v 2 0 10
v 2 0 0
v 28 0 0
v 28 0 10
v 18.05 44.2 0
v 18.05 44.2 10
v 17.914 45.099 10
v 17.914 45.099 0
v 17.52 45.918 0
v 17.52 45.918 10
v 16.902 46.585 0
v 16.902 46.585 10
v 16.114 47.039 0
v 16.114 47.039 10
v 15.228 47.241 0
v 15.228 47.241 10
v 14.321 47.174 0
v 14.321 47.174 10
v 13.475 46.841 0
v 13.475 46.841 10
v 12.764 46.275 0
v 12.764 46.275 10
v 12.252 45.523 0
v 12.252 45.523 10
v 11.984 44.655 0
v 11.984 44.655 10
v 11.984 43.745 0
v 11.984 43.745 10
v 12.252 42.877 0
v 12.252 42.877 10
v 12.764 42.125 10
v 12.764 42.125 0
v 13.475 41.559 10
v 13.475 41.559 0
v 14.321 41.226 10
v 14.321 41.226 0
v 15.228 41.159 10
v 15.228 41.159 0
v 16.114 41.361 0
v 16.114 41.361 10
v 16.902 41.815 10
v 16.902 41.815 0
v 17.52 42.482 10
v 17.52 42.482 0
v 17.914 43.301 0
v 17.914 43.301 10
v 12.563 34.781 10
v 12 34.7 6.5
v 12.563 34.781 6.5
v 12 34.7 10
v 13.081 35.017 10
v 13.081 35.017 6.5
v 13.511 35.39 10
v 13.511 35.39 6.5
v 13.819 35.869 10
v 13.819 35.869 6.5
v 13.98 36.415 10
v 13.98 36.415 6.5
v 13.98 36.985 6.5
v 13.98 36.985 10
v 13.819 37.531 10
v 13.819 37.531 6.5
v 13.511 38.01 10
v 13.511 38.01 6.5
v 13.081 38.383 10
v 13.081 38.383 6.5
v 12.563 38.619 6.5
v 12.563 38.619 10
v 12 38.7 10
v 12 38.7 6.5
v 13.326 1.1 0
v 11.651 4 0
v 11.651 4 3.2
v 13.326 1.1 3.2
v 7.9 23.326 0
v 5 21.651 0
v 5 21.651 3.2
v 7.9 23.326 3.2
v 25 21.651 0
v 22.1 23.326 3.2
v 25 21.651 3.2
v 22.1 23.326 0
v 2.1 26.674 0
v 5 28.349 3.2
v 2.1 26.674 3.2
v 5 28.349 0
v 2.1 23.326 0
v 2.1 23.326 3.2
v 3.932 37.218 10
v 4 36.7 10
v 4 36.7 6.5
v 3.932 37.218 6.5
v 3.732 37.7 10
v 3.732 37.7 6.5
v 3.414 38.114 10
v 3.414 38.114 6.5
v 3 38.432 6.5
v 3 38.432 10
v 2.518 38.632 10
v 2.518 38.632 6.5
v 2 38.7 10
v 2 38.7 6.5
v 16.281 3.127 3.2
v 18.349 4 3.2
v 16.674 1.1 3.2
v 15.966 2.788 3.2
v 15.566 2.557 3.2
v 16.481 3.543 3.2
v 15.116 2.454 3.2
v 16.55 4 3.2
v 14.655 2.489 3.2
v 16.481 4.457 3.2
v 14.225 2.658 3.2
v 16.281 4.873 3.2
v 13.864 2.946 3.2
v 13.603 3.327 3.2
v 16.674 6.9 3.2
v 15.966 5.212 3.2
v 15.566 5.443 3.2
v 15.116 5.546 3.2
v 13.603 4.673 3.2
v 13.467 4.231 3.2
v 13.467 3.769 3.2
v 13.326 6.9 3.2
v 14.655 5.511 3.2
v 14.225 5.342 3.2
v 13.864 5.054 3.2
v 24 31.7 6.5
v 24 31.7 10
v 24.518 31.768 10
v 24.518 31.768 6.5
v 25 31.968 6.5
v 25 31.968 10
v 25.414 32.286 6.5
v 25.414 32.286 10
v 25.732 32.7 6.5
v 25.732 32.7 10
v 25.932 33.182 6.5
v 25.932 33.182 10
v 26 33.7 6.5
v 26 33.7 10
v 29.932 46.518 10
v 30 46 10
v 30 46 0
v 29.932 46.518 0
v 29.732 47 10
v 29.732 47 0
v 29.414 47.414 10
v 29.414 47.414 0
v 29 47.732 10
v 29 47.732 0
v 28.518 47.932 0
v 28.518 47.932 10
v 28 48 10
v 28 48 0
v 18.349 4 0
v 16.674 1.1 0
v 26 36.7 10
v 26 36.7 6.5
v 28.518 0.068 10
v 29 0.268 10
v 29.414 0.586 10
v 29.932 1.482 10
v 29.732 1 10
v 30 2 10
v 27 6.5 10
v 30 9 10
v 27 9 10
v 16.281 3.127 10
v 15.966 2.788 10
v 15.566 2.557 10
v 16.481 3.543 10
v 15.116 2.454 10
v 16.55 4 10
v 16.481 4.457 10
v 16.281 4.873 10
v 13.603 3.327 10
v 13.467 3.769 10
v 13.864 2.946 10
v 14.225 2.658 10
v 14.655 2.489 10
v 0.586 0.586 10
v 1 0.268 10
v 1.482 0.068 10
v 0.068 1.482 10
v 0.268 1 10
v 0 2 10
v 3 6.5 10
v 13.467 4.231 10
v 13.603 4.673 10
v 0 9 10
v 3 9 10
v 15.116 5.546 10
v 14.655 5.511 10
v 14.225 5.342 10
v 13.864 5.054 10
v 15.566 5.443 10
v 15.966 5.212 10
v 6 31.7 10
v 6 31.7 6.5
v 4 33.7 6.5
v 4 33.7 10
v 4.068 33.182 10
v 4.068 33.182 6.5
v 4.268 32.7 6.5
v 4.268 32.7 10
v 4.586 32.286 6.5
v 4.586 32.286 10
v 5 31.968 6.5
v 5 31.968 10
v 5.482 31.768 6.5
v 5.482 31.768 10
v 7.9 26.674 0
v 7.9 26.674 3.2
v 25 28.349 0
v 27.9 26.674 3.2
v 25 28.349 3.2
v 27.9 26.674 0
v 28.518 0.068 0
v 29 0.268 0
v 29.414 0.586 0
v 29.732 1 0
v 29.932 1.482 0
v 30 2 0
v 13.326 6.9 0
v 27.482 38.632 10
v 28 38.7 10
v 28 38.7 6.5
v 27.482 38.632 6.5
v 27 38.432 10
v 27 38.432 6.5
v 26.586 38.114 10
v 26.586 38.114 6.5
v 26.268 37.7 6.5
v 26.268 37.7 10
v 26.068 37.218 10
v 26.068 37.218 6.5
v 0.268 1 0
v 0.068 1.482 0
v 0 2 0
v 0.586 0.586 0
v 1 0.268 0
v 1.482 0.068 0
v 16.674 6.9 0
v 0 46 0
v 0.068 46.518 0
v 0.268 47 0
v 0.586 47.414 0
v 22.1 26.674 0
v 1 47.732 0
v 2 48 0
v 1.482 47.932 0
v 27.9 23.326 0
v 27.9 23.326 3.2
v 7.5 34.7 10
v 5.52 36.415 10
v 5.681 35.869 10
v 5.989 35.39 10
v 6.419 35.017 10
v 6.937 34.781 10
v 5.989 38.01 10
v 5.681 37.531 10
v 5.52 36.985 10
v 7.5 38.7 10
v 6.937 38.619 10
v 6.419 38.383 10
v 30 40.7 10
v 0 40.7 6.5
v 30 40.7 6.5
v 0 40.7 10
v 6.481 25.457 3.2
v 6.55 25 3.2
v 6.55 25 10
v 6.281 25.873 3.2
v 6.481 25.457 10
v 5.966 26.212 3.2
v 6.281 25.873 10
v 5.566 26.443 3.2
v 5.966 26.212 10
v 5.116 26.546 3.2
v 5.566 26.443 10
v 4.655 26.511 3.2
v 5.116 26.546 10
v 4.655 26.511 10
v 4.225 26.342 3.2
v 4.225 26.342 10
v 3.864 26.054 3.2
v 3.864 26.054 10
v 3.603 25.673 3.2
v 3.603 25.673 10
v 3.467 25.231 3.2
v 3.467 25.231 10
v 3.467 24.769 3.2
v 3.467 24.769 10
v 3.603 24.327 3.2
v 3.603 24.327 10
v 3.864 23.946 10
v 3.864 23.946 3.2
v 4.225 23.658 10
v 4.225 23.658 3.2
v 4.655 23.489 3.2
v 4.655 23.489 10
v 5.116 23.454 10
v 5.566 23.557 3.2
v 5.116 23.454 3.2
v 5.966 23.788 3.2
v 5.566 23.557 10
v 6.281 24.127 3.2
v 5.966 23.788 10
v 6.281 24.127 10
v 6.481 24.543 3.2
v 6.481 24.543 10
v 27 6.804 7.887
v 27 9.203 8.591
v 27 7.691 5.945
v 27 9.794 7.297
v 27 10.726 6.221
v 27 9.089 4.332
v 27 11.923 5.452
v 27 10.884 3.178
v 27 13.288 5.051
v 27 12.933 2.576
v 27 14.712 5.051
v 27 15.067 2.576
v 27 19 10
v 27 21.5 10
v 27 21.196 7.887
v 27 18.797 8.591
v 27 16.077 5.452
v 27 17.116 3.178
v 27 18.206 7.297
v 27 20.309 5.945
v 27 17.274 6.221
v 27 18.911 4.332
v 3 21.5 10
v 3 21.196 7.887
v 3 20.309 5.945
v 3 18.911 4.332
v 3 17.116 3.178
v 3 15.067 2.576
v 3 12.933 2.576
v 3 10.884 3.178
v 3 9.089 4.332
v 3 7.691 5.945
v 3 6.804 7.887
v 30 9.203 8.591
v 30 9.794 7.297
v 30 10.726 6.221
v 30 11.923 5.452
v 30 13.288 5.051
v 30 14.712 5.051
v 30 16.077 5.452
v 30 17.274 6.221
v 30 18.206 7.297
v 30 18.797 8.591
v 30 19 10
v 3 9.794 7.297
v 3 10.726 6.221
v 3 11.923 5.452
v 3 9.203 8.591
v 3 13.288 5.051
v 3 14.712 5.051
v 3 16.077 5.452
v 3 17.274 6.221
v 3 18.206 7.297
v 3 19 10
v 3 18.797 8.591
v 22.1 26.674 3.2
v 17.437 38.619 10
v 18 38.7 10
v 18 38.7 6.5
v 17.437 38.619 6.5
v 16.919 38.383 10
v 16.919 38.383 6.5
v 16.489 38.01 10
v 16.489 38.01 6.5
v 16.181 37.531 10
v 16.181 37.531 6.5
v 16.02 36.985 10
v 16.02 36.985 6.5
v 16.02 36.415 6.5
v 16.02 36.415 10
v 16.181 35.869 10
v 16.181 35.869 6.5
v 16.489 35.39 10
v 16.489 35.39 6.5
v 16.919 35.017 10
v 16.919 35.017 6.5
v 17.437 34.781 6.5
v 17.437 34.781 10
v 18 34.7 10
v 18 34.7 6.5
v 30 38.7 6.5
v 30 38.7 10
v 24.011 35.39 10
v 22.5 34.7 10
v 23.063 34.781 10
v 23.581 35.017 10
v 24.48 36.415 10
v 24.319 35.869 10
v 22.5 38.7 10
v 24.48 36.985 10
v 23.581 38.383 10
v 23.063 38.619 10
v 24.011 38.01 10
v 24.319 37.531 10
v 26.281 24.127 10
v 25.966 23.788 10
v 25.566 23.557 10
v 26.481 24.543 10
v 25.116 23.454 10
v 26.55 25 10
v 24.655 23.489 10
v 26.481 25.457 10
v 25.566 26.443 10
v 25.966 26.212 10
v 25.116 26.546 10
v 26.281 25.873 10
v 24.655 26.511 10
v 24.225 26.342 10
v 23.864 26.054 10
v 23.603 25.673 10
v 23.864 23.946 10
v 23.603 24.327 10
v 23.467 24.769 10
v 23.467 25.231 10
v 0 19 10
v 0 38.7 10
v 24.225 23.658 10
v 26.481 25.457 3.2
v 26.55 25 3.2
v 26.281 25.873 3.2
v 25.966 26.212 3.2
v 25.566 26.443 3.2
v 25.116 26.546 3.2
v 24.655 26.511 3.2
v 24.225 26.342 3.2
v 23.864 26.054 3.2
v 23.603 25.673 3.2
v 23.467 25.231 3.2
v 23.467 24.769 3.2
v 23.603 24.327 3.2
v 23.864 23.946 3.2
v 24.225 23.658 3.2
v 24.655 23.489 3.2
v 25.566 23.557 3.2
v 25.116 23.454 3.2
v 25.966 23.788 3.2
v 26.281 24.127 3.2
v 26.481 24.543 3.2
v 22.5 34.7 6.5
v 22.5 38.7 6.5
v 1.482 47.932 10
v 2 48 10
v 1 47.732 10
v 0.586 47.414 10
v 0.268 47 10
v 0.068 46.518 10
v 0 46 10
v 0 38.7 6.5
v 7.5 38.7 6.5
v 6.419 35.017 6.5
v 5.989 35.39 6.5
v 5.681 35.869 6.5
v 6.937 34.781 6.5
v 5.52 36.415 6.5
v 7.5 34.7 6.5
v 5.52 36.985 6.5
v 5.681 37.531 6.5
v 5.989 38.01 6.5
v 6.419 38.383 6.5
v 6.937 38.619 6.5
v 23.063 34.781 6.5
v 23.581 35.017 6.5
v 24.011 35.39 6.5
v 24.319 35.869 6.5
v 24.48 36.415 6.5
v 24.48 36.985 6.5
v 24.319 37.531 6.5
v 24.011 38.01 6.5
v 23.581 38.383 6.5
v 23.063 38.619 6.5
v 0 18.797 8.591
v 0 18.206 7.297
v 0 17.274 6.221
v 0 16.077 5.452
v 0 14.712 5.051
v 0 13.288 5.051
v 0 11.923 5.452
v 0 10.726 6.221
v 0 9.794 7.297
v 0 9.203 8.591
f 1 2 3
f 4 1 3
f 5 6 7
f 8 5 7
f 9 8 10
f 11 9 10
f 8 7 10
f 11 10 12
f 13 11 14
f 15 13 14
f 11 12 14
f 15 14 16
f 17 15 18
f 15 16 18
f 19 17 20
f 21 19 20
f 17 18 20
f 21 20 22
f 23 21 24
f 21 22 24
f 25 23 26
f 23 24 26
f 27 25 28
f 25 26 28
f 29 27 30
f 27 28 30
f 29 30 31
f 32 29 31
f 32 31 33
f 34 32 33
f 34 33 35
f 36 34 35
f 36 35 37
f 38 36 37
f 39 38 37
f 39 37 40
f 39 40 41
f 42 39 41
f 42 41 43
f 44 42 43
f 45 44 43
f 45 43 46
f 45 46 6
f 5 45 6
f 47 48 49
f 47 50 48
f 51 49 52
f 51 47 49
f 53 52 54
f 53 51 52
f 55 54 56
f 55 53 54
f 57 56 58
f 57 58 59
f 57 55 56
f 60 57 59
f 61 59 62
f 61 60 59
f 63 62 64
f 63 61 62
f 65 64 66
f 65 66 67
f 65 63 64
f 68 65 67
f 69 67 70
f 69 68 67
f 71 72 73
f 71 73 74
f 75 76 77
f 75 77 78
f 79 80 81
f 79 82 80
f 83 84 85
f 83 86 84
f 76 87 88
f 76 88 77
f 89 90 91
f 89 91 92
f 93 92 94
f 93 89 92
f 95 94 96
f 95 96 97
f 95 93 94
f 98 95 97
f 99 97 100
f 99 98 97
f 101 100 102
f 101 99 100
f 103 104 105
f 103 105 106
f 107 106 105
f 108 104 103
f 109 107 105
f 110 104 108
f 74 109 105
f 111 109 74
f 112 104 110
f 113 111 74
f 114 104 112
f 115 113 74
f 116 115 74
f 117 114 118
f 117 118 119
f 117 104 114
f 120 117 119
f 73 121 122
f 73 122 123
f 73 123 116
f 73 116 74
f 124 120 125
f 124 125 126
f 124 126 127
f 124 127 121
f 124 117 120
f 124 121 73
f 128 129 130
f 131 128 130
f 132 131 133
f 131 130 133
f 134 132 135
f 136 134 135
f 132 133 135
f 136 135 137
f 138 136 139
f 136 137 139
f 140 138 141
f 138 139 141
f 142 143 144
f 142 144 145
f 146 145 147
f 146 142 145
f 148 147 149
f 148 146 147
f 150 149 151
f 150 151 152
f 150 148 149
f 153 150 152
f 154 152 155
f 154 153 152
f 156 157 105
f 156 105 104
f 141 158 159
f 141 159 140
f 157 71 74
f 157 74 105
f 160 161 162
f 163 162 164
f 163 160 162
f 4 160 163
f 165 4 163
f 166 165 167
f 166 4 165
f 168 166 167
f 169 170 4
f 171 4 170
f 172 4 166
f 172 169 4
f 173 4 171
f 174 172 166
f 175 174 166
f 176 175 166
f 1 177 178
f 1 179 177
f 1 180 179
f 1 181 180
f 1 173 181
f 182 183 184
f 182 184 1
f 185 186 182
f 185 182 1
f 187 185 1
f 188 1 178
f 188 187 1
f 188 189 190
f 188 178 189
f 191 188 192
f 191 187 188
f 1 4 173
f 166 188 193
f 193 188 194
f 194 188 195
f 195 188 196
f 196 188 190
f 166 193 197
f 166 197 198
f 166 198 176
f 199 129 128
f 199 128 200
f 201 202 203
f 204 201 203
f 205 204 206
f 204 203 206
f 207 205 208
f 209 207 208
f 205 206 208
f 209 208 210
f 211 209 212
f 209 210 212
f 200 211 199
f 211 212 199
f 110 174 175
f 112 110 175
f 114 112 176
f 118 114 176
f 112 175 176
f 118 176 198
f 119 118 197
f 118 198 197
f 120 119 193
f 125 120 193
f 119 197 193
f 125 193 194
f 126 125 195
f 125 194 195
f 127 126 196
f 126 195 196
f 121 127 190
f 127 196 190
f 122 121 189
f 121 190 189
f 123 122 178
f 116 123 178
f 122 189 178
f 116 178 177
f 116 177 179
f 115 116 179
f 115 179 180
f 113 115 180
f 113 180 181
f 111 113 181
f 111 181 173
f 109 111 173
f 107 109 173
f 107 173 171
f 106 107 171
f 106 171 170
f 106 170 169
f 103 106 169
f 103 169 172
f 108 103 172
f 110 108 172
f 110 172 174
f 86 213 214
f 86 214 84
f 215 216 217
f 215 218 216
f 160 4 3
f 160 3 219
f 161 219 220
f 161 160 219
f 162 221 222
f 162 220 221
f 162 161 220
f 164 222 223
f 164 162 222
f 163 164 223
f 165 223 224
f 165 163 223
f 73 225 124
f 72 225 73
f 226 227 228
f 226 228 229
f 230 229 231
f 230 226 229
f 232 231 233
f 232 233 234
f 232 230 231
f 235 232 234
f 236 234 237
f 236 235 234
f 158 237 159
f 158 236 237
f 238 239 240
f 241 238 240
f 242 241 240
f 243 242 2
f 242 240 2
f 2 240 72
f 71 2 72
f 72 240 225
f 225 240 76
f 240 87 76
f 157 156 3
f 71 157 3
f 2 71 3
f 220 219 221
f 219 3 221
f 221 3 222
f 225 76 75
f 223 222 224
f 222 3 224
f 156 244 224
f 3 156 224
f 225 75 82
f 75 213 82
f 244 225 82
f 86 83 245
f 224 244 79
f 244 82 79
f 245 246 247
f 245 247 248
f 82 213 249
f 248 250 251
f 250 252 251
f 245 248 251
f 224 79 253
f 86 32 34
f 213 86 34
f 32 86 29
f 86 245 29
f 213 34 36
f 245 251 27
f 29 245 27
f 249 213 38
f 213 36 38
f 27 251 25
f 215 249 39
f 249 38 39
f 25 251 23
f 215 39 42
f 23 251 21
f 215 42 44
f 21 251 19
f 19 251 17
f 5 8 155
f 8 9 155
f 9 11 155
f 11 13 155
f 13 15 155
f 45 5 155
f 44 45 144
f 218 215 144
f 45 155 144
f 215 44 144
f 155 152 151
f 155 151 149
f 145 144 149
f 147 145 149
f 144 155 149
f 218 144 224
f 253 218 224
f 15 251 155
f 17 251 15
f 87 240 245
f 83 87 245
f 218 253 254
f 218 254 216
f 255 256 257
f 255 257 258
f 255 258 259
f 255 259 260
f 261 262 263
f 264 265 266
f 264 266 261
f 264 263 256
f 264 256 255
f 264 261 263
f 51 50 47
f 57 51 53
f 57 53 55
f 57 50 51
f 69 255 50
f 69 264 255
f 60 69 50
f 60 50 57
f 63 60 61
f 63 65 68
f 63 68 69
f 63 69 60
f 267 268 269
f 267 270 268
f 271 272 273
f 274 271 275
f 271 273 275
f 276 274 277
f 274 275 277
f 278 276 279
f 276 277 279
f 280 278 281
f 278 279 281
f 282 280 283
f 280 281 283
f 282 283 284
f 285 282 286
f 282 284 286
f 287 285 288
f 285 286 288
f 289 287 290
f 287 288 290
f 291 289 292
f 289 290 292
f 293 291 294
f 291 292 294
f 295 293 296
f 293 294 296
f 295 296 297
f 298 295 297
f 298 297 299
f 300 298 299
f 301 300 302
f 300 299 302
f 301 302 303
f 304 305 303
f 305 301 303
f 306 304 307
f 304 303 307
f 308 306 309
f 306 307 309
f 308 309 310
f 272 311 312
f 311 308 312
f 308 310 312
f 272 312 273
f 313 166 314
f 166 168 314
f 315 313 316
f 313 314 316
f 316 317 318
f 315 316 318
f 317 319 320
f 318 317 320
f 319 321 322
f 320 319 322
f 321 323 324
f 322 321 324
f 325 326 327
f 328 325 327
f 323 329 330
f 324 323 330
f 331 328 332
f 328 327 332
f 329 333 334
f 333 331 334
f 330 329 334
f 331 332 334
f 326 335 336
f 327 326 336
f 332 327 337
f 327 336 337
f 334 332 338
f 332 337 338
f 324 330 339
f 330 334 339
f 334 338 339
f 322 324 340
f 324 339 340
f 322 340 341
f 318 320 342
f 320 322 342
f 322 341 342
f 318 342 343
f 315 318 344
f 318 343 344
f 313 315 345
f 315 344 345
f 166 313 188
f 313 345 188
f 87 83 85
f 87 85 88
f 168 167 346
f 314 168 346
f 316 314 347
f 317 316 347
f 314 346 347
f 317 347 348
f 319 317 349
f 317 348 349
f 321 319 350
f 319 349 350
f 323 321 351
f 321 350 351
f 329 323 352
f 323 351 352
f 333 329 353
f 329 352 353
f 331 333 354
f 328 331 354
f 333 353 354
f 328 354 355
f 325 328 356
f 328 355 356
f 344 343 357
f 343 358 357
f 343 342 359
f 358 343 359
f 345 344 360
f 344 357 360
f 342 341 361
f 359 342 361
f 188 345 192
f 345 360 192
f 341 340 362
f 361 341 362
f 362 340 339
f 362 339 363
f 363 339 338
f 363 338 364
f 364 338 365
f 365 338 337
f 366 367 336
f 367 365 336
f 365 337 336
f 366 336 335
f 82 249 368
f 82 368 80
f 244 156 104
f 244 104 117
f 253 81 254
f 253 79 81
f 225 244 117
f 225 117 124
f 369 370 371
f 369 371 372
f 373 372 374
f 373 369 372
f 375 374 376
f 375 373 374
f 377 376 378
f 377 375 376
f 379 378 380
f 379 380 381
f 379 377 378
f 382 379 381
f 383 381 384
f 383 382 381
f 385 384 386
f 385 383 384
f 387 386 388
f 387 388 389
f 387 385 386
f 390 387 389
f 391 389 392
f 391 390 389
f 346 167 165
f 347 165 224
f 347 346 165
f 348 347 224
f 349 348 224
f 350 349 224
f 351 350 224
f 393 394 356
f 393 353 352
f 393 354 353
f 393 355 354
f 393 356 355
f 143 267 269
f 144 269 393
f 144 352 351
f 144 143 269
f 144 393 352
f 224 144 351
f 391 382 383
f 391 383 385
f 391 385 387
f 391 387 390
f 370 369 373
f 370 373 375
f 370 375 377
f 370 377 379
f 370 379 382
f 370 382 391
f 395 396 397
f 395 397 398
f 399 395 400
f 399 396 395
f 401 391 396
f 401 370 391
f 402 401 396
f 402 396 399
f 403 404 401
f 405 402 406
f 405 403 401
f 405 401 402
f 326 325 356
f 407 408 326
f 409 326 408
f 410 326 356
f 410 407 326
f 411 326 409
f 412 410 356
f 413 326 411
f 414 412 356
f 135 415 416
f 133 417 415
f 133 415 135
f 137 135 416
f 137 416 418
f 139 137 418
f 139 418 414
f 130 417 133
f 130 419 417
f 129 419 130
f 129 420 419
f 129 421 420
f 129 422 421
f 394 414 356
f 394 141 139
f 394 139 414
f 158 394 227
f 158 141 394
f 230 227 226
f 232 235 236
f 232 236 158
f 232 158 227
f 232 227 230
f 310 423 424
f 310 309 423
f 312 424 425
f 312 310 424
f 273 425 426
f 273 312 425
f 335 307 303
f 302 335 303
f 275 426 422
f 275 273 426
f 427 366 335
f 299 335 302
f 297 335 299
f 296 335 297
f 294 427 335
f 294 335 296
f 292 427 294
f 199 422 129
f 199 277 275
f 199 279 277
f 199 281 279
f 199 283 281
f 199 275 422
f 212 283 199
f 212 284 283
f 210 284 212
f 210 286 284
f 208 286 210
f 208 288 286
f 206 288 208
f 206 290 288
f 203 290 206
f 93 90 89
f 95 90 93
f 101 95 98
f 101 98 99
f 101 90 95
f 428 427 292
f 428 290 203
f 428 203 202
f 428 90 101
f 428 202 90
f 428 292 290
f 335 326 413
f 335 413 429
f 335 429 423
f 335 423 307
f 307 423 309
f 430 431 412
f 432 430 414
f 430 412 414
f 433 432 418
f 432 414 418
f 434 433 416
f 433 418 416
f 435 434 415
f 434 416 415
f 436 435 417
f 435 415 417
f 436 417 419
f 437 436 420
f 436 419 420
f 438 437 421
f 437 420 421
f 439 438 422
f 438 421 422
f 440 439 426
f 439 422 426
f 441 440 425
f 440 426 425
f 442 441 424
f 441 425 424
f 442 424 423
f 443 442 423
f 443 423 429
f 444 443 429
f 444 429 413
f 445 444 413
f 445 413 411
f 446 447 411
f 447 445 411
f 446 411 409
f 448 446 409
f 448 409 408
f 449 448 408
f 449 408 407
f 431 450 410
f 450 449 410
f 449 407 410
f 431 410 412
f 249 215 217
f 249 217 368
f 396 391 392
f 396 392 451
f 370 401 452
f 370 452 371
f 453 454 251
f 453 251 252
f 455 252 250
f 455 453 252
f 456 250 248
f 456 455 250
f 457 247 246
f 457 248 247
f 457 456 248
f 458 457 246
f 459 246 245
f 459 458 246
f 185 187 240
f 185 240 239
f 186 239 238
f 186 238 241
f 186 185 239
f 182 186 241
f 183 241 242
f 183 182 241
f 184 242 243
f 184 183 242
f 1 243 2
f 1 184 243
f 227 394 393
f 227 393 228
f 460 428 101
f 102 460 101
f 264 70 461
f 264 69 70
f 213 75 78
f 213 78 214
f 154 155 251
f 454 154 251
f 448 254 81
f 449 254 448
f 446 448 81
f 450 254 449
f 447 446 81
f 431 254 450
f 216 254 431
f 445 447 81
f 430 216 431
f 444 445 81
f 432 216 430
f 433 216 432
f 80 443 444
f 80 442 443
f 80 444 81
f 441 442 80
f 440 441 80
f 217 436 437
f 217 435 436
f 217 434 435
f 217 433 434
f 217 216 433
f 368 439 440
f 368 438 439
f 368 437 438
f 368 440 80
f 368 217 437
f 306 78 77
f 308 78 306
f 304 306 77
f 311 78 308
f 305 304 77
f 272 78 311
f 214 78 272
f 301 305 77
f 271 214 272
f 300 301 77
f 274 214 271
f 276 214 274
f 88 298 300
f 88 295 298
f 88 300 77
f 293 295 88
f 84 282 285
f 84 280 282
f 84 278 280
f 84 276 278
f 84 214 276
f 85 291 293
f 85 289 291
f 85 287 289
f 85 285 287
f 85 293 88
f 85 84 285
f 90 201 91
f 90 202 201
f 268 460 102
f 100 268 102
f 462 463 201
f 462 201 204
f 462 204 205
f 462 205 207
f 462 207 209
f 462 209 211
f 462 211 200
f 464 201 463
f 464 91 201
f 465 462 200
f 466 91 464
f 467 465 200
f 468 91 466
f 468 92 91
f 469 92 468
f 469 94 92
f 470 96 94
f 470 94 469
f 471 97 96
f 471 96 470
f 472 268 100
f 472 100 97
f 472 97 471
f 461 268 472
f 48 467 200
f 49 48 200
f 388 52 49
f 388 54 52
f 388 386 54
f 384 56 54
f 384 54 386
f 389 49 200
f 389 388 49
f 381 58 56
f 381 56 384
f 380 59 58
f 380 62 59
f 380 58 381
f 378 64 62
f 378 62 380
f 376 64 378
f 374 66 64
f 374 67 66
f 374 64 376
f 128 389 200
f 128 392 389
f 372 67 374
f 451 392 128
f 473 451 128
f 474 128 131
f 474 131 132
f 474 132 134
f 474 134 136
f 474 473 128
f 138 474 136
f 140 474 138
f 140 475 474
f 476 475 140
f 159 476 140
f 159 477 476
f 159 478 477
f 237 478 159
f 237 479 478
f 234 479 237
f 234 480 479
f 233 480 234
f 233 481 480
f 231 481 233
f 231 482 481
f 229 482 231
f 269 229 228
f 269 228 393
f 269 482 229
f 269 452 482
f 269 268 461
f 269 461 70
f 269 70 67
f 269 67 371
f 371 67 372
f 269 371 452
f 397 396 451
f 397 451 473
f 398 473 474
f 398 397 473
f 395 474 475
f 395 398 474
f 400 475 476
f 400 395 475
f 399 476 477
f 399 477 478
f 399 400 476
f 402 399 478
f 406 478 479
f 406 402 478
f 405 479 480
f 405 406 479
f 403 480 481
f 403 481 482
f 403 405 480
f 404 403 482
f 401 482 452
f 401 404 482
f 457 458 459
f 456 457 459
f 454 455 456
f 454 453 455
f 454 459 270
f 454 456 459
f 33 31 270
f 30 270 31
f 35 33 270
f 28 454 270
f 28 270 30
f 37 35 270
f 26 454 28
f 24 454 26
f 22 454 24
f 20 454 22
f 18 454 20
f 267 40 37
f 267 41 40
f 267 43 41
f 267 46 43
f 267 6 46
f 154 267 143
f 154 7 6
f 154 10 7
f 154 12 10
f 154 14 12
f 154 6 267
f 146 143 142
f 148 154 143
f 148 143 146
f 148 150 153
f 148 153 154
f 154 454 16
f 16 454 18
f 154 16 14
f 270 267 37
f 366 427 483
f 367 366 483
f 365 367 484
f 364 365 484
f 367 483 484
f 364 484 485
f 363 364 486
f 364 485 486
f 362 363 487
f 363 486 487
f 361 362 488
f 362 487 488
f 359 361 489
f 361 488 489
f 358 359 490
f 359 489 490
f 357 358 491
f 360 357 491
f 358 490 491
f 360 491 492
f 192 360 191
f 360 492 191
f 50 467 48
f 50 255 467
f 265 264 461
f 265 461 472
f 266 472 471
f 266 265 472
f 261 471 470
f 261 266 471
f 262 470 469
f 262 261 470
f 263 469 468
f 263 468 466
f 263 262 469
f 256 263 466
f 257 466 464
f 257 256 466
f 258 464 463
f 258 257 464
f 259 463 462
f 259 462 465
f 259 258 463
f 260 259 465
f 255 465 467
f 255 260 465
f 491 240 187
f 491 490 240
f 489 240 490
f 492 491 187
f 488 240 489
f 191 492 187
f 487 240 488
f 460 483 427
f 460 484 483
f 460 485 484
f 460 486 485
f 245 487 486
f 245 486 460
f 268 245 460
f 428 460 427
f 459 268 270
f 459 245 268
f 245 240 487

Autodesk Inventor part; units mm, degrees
ref_plane "YZ Plane" through (0, 0, 0) normal (1, 0, 0) x (0, 1, 0)
ref_plane "XZ Plane" through (0, 0, 0) normal (0, 1, 0) x (-1, 0, 0)
ref_plane "XY Plane" through (0, 0, 0) normal (0, 0, 1) x (1, 0, 0)
sketch "Skizze3" plane through (0, 0, 0) normal (0, 0, 1) x (1, 0, 0)
  line L0 (0, 0) -> (30, 0)
  line L1 (30, 0) -> (30, 48)
  line L2 (30, 48) -> (0, 48)
  line L3 (0, 48) -> (0, 0)
  dimension "d14" = 30
  dimension "d15" = 48
extrude "Extrusion3" add sketch "Skizze3" along normal blind 10
sketch "Skizze4" plane through (0, 0, 0) normal (-1, 0, 0) x (0, 0, 1)
  line L0 (10, 0) -> (10, 48) projected
  arc A0 (10, 21.5) -> (10, 6.5) centre (10, 14) ccw
  line L1 (10, 21.5) -> (10, 6.5)
  point P0 (0, 0)
  dimension "d18" = 7.5
  dimension "d19" = 14
extrude "Extrusion4" cut sketch "Skizze4" against normal up to next
sketch "Skizze5" plane through (0, 0, 10) normal (0, 0, 1) x (1, 0, 0)
  line L0 (0, 40.7) -> (30, 40.7)
  line L1 (30, 40.7) -> (30, 38.7)
  line L2 (0, 38.7) -> (0, 40.7)
  line L3 (30, 38.7) -> (28, 38.7)
  line L4 (0, 38.7) -> (2, 38.7)
  line L5 (30, 48) -> (0, 48) projected
  line L6 (26, 36.7) -> (26, 33.7)
  line L7 (24, 31.7) -> (6, 31.7)
  line L8 (4, 33.7) -> (4, 36.7)
  line L9 (0, 21.5) -> (30, 21.5) projected
  arc A0 (4, 36.7) -> (2, 38.7) centre (2, 36.7) ccw
  arc A1 (4, 33.7) -> (6, 31.7) centre (6, 33.7) ccw
  arc A2 (24, 31.7) -> (26, 33.7) centre (24, 33.7) ccw
  arc A3 (28, 38.7) -> (26, 36.7) centre (28, 36.7) ccw
  line L10 (7.5, 36.7) -> (12, 36.7) construction
  line L11 (7.5, 34.7) -> (12, 34.7)
  line L12 (12, 38.7) -> (7.5, 38.7)
  arc A4 (7.5, 38.7) -> (7.5, 34.7) centre (7.5, 36.7) ccw
  arc A5 (12, 34.7) -> (12, 38.7) centre (12, 36.7) ccw
  line L13 (18, 36.7) -> (22.5, 36.7) construction
  line L14 (18, 34.7) -> (22.5, 34.7)
  line L15 (22.5, 38.7) -> (18, 38.7)
  arc A6 (18, 38.7) -> (18, 34.7) centre (18, 36.7) ccw
  arc A7 (22.5, 34.7) -> (22.5, 38.7) centre (22.5, 36.7) ccw
  line L16 (30, 21.5) -> (30, 48) projected
  line L17 (0, 48) -> (0, 21.5) projected
  point P0 (26, 38.7)
  point P1 (4, 38.7)
  point P2 (26, 31.7)
  point P3 (4, 31.7)
  point P4 (9.75, 36.7)
  point P5 (20.25, 36.7)
  dimension "d22" = 2
  dimension "d28" = 4
  dimension "d29" = 4
  dimension "d30" = 2
  dimension "d34" = 7
  dimension "d48" = 2
  dimension "d83" = 7.3
  dimension "d84" = 4.5
  dimension "d85" = 4
  dimension "d86" = 3.5
  dimension "d87" = 5
  dimension "d88" = 4.5
  dimension "d89" = 4
  dimension "d90" = 3.5
  dimension "d91" = 5
extrude "Extrusion5" cut sketch "Skizze5" against normal blind 3.5 contours L0 L1 L3 A3 L6 A2 L7 A1 L8 A0 L4 L2
sketch "Skizze6" plane through (0, 0, 10) normal (0, 0, 1) x (1, 0, 0)
  line L0 (0, 48) -> (0, 0) projected
  line L1 (30, 0) -> (30, 48) projected
  circle A0 centre (15, 44.2) radius 3.05
  line L2 (0, 40.7) -> (30, 40.7) projected
  dimension "d43" = 6.1
  dimension "d44" = 15
  dimension "d45" = 3.5
extrude "Extrusion6" cut sketch "Skizze6" against normal up to next
sketch "Skizze7" plane through (0, 0, 10) normal (0, 0, 1) x (1, 0, 0)
  circle A0 centre (5, 25) radius 1.55
  circle A1 centre (25, 25) radius 1.55
  circle A2 centre (15, 4) radius 1.55
  line L0 (0, 6.5) -> (0, 21.5) projected
  line L1 (30, 21.5) -> (30, 6.5) projected
  line L2 (0, 0) -> (30, 0) projected
  line L3 (0, 6.5) -> (0, 0) projected
  line L4 (0, 21.5) -> (30, 21.5) projected
  point P0 (0, 38.7)
  point P1 (30, 38.7)
  dimension "d49" = 3.1
  dimension "d50" = 3.1
  dimension "d51" = 3.1
  dimension "d53" = 5
  dimension "d54" = 5
  dimension "d55" = 4
  dimension "d74" = 15
  dimension "d75" = 3.5
  dimension "d76" = 3.5
extrude "Extrusion7" cut sketch "Skizze7" against normal up to next
sketch "Skizze8" plane through (30, 0, 0) normal (1, 0, 0) x (0, 0, -1)
  arc A0 (-10, 6.5) -> (-10, 21.5) centre (-10, 14) ccw projected
  arc A1 (-10, 9) -> (-10, 19) centre (-10, 14) ccw
  line L0 (-10, 19) -> (-10, 21.5)
  line L1 (-10, 9) -> (-10, 6.5)
  arc A2 (-10, 6.5) -> (-10, 21.5) centre (-10, 14) ccw
  point P0 (0, 0)
  dimension "d59" = 5
extrude "Extrusion8" add sketch "Skizze8" against normal blind 3
sketch "Skizze10" plane through (0, 0, 0) normal (-1, 0, 0) x (0, 0, 1)
  arc A0 (10, 19) -> (10, 9) centre (10, 14) ccw
  arc A1 (10, 21.5121) -> (10, 6.4879) centre (10, 14) ccw
  arc A2 (10, 19) -> (10, 9) centre (10, 14) ccw projected
  line L0 (10, 19) -> (10, 21.5121)
  line L1 (10, 6.5) -> (10, 21.5) projected
  line L2 (10, 9) -> (10, 6.4879)
  point P0 (0, 0)
  point P1 (10, 38.7)
extrude "Extrusion9" add sketch "Skizze10" against normal blind 3 contours A0 L1 L2 A1 L0
fillet "Rundung1" radius 2 4 edges at (30, 0, 5) (0, 0, 5) (0, 48, 5) (30, 48, 5)
sketch "Skizze14" plane through (0, 0, 0) normal (0, 0, -1) x (-1, 0, 0)
  circle A0 centre (-5, 25) radius 1.55 projected
  circle A1 centre (-5, 25) radius 2.9 construction
  circle A2 centre (-25, 25) radius 1.55 projected
  circle A3 centre (-25, 25) radius 2.9 construction
  line L0 (-7.9, 26.6743) -> (-5, 28.3486)
  line L1 (-5, 28.3486) -> (-2.1, 26.6743)
  line L2 (-2.1, 26.6743) -> (-2.1, 23.3257)
  line L3 (-2.1, 23.3257) -> (-5, 21.6514)
  line L4 (-5, 21.6514) -> (-7.9, 23.3257)
  line L5 (-7.9, 23.3257) -> (-7.9, 26.6743)
  line L6 (-22.1, 23.3257) -> (-25, 21.6514)
  line L7 (-25, 21.6514) -> (-27.9, 23.3257)
  line L8 (-27.9, 23.3257) -> (-27.9, 26.6743)
  line L9 (-27.9, 26.6743) -> (-25, 28.3486)
  line L10 (-25, 28.3486) -> (-22.1, 26.6743)
  line L11 (-22.1, 26.6743) -> (-22.1, 23.3257)
  circle A4 centre (-15, 4) radius 2.9 construction
  line L12 (-16.6743, 1.1) -> (-18.3486, 4)
  line L13 (-18.3486, 4) -> (-16.6743, 6.9)
  line L14 (-16.6743, 6.9) -> (-13.3257, 6.9)
  line L15 (-13.3257, 6.9) -> (-11.6514, 4)
  line L16 (-11.6514, 4) -> (-13.3257, 1.1)
  line L17 (-13.3257, 1.1) -> (-16.6743, 1.1)
  point P0 (0, 0)
  point P1 (-7.9, 25)
  point P2 (-22.1, 25)
  point P3 (-15, 1.1)
  dimension "d92" = 5.8
  dimension "d95" = 5.8
  dimension "d98" = 5.8
  dimension "d99" = 0
  dimension "d100" = 0
extrude "Extrusion13" cut sketch "Skizze14" against normal blind 3.2
properties part number "Lagerblock XY" material "ABS-Kunststoff"
